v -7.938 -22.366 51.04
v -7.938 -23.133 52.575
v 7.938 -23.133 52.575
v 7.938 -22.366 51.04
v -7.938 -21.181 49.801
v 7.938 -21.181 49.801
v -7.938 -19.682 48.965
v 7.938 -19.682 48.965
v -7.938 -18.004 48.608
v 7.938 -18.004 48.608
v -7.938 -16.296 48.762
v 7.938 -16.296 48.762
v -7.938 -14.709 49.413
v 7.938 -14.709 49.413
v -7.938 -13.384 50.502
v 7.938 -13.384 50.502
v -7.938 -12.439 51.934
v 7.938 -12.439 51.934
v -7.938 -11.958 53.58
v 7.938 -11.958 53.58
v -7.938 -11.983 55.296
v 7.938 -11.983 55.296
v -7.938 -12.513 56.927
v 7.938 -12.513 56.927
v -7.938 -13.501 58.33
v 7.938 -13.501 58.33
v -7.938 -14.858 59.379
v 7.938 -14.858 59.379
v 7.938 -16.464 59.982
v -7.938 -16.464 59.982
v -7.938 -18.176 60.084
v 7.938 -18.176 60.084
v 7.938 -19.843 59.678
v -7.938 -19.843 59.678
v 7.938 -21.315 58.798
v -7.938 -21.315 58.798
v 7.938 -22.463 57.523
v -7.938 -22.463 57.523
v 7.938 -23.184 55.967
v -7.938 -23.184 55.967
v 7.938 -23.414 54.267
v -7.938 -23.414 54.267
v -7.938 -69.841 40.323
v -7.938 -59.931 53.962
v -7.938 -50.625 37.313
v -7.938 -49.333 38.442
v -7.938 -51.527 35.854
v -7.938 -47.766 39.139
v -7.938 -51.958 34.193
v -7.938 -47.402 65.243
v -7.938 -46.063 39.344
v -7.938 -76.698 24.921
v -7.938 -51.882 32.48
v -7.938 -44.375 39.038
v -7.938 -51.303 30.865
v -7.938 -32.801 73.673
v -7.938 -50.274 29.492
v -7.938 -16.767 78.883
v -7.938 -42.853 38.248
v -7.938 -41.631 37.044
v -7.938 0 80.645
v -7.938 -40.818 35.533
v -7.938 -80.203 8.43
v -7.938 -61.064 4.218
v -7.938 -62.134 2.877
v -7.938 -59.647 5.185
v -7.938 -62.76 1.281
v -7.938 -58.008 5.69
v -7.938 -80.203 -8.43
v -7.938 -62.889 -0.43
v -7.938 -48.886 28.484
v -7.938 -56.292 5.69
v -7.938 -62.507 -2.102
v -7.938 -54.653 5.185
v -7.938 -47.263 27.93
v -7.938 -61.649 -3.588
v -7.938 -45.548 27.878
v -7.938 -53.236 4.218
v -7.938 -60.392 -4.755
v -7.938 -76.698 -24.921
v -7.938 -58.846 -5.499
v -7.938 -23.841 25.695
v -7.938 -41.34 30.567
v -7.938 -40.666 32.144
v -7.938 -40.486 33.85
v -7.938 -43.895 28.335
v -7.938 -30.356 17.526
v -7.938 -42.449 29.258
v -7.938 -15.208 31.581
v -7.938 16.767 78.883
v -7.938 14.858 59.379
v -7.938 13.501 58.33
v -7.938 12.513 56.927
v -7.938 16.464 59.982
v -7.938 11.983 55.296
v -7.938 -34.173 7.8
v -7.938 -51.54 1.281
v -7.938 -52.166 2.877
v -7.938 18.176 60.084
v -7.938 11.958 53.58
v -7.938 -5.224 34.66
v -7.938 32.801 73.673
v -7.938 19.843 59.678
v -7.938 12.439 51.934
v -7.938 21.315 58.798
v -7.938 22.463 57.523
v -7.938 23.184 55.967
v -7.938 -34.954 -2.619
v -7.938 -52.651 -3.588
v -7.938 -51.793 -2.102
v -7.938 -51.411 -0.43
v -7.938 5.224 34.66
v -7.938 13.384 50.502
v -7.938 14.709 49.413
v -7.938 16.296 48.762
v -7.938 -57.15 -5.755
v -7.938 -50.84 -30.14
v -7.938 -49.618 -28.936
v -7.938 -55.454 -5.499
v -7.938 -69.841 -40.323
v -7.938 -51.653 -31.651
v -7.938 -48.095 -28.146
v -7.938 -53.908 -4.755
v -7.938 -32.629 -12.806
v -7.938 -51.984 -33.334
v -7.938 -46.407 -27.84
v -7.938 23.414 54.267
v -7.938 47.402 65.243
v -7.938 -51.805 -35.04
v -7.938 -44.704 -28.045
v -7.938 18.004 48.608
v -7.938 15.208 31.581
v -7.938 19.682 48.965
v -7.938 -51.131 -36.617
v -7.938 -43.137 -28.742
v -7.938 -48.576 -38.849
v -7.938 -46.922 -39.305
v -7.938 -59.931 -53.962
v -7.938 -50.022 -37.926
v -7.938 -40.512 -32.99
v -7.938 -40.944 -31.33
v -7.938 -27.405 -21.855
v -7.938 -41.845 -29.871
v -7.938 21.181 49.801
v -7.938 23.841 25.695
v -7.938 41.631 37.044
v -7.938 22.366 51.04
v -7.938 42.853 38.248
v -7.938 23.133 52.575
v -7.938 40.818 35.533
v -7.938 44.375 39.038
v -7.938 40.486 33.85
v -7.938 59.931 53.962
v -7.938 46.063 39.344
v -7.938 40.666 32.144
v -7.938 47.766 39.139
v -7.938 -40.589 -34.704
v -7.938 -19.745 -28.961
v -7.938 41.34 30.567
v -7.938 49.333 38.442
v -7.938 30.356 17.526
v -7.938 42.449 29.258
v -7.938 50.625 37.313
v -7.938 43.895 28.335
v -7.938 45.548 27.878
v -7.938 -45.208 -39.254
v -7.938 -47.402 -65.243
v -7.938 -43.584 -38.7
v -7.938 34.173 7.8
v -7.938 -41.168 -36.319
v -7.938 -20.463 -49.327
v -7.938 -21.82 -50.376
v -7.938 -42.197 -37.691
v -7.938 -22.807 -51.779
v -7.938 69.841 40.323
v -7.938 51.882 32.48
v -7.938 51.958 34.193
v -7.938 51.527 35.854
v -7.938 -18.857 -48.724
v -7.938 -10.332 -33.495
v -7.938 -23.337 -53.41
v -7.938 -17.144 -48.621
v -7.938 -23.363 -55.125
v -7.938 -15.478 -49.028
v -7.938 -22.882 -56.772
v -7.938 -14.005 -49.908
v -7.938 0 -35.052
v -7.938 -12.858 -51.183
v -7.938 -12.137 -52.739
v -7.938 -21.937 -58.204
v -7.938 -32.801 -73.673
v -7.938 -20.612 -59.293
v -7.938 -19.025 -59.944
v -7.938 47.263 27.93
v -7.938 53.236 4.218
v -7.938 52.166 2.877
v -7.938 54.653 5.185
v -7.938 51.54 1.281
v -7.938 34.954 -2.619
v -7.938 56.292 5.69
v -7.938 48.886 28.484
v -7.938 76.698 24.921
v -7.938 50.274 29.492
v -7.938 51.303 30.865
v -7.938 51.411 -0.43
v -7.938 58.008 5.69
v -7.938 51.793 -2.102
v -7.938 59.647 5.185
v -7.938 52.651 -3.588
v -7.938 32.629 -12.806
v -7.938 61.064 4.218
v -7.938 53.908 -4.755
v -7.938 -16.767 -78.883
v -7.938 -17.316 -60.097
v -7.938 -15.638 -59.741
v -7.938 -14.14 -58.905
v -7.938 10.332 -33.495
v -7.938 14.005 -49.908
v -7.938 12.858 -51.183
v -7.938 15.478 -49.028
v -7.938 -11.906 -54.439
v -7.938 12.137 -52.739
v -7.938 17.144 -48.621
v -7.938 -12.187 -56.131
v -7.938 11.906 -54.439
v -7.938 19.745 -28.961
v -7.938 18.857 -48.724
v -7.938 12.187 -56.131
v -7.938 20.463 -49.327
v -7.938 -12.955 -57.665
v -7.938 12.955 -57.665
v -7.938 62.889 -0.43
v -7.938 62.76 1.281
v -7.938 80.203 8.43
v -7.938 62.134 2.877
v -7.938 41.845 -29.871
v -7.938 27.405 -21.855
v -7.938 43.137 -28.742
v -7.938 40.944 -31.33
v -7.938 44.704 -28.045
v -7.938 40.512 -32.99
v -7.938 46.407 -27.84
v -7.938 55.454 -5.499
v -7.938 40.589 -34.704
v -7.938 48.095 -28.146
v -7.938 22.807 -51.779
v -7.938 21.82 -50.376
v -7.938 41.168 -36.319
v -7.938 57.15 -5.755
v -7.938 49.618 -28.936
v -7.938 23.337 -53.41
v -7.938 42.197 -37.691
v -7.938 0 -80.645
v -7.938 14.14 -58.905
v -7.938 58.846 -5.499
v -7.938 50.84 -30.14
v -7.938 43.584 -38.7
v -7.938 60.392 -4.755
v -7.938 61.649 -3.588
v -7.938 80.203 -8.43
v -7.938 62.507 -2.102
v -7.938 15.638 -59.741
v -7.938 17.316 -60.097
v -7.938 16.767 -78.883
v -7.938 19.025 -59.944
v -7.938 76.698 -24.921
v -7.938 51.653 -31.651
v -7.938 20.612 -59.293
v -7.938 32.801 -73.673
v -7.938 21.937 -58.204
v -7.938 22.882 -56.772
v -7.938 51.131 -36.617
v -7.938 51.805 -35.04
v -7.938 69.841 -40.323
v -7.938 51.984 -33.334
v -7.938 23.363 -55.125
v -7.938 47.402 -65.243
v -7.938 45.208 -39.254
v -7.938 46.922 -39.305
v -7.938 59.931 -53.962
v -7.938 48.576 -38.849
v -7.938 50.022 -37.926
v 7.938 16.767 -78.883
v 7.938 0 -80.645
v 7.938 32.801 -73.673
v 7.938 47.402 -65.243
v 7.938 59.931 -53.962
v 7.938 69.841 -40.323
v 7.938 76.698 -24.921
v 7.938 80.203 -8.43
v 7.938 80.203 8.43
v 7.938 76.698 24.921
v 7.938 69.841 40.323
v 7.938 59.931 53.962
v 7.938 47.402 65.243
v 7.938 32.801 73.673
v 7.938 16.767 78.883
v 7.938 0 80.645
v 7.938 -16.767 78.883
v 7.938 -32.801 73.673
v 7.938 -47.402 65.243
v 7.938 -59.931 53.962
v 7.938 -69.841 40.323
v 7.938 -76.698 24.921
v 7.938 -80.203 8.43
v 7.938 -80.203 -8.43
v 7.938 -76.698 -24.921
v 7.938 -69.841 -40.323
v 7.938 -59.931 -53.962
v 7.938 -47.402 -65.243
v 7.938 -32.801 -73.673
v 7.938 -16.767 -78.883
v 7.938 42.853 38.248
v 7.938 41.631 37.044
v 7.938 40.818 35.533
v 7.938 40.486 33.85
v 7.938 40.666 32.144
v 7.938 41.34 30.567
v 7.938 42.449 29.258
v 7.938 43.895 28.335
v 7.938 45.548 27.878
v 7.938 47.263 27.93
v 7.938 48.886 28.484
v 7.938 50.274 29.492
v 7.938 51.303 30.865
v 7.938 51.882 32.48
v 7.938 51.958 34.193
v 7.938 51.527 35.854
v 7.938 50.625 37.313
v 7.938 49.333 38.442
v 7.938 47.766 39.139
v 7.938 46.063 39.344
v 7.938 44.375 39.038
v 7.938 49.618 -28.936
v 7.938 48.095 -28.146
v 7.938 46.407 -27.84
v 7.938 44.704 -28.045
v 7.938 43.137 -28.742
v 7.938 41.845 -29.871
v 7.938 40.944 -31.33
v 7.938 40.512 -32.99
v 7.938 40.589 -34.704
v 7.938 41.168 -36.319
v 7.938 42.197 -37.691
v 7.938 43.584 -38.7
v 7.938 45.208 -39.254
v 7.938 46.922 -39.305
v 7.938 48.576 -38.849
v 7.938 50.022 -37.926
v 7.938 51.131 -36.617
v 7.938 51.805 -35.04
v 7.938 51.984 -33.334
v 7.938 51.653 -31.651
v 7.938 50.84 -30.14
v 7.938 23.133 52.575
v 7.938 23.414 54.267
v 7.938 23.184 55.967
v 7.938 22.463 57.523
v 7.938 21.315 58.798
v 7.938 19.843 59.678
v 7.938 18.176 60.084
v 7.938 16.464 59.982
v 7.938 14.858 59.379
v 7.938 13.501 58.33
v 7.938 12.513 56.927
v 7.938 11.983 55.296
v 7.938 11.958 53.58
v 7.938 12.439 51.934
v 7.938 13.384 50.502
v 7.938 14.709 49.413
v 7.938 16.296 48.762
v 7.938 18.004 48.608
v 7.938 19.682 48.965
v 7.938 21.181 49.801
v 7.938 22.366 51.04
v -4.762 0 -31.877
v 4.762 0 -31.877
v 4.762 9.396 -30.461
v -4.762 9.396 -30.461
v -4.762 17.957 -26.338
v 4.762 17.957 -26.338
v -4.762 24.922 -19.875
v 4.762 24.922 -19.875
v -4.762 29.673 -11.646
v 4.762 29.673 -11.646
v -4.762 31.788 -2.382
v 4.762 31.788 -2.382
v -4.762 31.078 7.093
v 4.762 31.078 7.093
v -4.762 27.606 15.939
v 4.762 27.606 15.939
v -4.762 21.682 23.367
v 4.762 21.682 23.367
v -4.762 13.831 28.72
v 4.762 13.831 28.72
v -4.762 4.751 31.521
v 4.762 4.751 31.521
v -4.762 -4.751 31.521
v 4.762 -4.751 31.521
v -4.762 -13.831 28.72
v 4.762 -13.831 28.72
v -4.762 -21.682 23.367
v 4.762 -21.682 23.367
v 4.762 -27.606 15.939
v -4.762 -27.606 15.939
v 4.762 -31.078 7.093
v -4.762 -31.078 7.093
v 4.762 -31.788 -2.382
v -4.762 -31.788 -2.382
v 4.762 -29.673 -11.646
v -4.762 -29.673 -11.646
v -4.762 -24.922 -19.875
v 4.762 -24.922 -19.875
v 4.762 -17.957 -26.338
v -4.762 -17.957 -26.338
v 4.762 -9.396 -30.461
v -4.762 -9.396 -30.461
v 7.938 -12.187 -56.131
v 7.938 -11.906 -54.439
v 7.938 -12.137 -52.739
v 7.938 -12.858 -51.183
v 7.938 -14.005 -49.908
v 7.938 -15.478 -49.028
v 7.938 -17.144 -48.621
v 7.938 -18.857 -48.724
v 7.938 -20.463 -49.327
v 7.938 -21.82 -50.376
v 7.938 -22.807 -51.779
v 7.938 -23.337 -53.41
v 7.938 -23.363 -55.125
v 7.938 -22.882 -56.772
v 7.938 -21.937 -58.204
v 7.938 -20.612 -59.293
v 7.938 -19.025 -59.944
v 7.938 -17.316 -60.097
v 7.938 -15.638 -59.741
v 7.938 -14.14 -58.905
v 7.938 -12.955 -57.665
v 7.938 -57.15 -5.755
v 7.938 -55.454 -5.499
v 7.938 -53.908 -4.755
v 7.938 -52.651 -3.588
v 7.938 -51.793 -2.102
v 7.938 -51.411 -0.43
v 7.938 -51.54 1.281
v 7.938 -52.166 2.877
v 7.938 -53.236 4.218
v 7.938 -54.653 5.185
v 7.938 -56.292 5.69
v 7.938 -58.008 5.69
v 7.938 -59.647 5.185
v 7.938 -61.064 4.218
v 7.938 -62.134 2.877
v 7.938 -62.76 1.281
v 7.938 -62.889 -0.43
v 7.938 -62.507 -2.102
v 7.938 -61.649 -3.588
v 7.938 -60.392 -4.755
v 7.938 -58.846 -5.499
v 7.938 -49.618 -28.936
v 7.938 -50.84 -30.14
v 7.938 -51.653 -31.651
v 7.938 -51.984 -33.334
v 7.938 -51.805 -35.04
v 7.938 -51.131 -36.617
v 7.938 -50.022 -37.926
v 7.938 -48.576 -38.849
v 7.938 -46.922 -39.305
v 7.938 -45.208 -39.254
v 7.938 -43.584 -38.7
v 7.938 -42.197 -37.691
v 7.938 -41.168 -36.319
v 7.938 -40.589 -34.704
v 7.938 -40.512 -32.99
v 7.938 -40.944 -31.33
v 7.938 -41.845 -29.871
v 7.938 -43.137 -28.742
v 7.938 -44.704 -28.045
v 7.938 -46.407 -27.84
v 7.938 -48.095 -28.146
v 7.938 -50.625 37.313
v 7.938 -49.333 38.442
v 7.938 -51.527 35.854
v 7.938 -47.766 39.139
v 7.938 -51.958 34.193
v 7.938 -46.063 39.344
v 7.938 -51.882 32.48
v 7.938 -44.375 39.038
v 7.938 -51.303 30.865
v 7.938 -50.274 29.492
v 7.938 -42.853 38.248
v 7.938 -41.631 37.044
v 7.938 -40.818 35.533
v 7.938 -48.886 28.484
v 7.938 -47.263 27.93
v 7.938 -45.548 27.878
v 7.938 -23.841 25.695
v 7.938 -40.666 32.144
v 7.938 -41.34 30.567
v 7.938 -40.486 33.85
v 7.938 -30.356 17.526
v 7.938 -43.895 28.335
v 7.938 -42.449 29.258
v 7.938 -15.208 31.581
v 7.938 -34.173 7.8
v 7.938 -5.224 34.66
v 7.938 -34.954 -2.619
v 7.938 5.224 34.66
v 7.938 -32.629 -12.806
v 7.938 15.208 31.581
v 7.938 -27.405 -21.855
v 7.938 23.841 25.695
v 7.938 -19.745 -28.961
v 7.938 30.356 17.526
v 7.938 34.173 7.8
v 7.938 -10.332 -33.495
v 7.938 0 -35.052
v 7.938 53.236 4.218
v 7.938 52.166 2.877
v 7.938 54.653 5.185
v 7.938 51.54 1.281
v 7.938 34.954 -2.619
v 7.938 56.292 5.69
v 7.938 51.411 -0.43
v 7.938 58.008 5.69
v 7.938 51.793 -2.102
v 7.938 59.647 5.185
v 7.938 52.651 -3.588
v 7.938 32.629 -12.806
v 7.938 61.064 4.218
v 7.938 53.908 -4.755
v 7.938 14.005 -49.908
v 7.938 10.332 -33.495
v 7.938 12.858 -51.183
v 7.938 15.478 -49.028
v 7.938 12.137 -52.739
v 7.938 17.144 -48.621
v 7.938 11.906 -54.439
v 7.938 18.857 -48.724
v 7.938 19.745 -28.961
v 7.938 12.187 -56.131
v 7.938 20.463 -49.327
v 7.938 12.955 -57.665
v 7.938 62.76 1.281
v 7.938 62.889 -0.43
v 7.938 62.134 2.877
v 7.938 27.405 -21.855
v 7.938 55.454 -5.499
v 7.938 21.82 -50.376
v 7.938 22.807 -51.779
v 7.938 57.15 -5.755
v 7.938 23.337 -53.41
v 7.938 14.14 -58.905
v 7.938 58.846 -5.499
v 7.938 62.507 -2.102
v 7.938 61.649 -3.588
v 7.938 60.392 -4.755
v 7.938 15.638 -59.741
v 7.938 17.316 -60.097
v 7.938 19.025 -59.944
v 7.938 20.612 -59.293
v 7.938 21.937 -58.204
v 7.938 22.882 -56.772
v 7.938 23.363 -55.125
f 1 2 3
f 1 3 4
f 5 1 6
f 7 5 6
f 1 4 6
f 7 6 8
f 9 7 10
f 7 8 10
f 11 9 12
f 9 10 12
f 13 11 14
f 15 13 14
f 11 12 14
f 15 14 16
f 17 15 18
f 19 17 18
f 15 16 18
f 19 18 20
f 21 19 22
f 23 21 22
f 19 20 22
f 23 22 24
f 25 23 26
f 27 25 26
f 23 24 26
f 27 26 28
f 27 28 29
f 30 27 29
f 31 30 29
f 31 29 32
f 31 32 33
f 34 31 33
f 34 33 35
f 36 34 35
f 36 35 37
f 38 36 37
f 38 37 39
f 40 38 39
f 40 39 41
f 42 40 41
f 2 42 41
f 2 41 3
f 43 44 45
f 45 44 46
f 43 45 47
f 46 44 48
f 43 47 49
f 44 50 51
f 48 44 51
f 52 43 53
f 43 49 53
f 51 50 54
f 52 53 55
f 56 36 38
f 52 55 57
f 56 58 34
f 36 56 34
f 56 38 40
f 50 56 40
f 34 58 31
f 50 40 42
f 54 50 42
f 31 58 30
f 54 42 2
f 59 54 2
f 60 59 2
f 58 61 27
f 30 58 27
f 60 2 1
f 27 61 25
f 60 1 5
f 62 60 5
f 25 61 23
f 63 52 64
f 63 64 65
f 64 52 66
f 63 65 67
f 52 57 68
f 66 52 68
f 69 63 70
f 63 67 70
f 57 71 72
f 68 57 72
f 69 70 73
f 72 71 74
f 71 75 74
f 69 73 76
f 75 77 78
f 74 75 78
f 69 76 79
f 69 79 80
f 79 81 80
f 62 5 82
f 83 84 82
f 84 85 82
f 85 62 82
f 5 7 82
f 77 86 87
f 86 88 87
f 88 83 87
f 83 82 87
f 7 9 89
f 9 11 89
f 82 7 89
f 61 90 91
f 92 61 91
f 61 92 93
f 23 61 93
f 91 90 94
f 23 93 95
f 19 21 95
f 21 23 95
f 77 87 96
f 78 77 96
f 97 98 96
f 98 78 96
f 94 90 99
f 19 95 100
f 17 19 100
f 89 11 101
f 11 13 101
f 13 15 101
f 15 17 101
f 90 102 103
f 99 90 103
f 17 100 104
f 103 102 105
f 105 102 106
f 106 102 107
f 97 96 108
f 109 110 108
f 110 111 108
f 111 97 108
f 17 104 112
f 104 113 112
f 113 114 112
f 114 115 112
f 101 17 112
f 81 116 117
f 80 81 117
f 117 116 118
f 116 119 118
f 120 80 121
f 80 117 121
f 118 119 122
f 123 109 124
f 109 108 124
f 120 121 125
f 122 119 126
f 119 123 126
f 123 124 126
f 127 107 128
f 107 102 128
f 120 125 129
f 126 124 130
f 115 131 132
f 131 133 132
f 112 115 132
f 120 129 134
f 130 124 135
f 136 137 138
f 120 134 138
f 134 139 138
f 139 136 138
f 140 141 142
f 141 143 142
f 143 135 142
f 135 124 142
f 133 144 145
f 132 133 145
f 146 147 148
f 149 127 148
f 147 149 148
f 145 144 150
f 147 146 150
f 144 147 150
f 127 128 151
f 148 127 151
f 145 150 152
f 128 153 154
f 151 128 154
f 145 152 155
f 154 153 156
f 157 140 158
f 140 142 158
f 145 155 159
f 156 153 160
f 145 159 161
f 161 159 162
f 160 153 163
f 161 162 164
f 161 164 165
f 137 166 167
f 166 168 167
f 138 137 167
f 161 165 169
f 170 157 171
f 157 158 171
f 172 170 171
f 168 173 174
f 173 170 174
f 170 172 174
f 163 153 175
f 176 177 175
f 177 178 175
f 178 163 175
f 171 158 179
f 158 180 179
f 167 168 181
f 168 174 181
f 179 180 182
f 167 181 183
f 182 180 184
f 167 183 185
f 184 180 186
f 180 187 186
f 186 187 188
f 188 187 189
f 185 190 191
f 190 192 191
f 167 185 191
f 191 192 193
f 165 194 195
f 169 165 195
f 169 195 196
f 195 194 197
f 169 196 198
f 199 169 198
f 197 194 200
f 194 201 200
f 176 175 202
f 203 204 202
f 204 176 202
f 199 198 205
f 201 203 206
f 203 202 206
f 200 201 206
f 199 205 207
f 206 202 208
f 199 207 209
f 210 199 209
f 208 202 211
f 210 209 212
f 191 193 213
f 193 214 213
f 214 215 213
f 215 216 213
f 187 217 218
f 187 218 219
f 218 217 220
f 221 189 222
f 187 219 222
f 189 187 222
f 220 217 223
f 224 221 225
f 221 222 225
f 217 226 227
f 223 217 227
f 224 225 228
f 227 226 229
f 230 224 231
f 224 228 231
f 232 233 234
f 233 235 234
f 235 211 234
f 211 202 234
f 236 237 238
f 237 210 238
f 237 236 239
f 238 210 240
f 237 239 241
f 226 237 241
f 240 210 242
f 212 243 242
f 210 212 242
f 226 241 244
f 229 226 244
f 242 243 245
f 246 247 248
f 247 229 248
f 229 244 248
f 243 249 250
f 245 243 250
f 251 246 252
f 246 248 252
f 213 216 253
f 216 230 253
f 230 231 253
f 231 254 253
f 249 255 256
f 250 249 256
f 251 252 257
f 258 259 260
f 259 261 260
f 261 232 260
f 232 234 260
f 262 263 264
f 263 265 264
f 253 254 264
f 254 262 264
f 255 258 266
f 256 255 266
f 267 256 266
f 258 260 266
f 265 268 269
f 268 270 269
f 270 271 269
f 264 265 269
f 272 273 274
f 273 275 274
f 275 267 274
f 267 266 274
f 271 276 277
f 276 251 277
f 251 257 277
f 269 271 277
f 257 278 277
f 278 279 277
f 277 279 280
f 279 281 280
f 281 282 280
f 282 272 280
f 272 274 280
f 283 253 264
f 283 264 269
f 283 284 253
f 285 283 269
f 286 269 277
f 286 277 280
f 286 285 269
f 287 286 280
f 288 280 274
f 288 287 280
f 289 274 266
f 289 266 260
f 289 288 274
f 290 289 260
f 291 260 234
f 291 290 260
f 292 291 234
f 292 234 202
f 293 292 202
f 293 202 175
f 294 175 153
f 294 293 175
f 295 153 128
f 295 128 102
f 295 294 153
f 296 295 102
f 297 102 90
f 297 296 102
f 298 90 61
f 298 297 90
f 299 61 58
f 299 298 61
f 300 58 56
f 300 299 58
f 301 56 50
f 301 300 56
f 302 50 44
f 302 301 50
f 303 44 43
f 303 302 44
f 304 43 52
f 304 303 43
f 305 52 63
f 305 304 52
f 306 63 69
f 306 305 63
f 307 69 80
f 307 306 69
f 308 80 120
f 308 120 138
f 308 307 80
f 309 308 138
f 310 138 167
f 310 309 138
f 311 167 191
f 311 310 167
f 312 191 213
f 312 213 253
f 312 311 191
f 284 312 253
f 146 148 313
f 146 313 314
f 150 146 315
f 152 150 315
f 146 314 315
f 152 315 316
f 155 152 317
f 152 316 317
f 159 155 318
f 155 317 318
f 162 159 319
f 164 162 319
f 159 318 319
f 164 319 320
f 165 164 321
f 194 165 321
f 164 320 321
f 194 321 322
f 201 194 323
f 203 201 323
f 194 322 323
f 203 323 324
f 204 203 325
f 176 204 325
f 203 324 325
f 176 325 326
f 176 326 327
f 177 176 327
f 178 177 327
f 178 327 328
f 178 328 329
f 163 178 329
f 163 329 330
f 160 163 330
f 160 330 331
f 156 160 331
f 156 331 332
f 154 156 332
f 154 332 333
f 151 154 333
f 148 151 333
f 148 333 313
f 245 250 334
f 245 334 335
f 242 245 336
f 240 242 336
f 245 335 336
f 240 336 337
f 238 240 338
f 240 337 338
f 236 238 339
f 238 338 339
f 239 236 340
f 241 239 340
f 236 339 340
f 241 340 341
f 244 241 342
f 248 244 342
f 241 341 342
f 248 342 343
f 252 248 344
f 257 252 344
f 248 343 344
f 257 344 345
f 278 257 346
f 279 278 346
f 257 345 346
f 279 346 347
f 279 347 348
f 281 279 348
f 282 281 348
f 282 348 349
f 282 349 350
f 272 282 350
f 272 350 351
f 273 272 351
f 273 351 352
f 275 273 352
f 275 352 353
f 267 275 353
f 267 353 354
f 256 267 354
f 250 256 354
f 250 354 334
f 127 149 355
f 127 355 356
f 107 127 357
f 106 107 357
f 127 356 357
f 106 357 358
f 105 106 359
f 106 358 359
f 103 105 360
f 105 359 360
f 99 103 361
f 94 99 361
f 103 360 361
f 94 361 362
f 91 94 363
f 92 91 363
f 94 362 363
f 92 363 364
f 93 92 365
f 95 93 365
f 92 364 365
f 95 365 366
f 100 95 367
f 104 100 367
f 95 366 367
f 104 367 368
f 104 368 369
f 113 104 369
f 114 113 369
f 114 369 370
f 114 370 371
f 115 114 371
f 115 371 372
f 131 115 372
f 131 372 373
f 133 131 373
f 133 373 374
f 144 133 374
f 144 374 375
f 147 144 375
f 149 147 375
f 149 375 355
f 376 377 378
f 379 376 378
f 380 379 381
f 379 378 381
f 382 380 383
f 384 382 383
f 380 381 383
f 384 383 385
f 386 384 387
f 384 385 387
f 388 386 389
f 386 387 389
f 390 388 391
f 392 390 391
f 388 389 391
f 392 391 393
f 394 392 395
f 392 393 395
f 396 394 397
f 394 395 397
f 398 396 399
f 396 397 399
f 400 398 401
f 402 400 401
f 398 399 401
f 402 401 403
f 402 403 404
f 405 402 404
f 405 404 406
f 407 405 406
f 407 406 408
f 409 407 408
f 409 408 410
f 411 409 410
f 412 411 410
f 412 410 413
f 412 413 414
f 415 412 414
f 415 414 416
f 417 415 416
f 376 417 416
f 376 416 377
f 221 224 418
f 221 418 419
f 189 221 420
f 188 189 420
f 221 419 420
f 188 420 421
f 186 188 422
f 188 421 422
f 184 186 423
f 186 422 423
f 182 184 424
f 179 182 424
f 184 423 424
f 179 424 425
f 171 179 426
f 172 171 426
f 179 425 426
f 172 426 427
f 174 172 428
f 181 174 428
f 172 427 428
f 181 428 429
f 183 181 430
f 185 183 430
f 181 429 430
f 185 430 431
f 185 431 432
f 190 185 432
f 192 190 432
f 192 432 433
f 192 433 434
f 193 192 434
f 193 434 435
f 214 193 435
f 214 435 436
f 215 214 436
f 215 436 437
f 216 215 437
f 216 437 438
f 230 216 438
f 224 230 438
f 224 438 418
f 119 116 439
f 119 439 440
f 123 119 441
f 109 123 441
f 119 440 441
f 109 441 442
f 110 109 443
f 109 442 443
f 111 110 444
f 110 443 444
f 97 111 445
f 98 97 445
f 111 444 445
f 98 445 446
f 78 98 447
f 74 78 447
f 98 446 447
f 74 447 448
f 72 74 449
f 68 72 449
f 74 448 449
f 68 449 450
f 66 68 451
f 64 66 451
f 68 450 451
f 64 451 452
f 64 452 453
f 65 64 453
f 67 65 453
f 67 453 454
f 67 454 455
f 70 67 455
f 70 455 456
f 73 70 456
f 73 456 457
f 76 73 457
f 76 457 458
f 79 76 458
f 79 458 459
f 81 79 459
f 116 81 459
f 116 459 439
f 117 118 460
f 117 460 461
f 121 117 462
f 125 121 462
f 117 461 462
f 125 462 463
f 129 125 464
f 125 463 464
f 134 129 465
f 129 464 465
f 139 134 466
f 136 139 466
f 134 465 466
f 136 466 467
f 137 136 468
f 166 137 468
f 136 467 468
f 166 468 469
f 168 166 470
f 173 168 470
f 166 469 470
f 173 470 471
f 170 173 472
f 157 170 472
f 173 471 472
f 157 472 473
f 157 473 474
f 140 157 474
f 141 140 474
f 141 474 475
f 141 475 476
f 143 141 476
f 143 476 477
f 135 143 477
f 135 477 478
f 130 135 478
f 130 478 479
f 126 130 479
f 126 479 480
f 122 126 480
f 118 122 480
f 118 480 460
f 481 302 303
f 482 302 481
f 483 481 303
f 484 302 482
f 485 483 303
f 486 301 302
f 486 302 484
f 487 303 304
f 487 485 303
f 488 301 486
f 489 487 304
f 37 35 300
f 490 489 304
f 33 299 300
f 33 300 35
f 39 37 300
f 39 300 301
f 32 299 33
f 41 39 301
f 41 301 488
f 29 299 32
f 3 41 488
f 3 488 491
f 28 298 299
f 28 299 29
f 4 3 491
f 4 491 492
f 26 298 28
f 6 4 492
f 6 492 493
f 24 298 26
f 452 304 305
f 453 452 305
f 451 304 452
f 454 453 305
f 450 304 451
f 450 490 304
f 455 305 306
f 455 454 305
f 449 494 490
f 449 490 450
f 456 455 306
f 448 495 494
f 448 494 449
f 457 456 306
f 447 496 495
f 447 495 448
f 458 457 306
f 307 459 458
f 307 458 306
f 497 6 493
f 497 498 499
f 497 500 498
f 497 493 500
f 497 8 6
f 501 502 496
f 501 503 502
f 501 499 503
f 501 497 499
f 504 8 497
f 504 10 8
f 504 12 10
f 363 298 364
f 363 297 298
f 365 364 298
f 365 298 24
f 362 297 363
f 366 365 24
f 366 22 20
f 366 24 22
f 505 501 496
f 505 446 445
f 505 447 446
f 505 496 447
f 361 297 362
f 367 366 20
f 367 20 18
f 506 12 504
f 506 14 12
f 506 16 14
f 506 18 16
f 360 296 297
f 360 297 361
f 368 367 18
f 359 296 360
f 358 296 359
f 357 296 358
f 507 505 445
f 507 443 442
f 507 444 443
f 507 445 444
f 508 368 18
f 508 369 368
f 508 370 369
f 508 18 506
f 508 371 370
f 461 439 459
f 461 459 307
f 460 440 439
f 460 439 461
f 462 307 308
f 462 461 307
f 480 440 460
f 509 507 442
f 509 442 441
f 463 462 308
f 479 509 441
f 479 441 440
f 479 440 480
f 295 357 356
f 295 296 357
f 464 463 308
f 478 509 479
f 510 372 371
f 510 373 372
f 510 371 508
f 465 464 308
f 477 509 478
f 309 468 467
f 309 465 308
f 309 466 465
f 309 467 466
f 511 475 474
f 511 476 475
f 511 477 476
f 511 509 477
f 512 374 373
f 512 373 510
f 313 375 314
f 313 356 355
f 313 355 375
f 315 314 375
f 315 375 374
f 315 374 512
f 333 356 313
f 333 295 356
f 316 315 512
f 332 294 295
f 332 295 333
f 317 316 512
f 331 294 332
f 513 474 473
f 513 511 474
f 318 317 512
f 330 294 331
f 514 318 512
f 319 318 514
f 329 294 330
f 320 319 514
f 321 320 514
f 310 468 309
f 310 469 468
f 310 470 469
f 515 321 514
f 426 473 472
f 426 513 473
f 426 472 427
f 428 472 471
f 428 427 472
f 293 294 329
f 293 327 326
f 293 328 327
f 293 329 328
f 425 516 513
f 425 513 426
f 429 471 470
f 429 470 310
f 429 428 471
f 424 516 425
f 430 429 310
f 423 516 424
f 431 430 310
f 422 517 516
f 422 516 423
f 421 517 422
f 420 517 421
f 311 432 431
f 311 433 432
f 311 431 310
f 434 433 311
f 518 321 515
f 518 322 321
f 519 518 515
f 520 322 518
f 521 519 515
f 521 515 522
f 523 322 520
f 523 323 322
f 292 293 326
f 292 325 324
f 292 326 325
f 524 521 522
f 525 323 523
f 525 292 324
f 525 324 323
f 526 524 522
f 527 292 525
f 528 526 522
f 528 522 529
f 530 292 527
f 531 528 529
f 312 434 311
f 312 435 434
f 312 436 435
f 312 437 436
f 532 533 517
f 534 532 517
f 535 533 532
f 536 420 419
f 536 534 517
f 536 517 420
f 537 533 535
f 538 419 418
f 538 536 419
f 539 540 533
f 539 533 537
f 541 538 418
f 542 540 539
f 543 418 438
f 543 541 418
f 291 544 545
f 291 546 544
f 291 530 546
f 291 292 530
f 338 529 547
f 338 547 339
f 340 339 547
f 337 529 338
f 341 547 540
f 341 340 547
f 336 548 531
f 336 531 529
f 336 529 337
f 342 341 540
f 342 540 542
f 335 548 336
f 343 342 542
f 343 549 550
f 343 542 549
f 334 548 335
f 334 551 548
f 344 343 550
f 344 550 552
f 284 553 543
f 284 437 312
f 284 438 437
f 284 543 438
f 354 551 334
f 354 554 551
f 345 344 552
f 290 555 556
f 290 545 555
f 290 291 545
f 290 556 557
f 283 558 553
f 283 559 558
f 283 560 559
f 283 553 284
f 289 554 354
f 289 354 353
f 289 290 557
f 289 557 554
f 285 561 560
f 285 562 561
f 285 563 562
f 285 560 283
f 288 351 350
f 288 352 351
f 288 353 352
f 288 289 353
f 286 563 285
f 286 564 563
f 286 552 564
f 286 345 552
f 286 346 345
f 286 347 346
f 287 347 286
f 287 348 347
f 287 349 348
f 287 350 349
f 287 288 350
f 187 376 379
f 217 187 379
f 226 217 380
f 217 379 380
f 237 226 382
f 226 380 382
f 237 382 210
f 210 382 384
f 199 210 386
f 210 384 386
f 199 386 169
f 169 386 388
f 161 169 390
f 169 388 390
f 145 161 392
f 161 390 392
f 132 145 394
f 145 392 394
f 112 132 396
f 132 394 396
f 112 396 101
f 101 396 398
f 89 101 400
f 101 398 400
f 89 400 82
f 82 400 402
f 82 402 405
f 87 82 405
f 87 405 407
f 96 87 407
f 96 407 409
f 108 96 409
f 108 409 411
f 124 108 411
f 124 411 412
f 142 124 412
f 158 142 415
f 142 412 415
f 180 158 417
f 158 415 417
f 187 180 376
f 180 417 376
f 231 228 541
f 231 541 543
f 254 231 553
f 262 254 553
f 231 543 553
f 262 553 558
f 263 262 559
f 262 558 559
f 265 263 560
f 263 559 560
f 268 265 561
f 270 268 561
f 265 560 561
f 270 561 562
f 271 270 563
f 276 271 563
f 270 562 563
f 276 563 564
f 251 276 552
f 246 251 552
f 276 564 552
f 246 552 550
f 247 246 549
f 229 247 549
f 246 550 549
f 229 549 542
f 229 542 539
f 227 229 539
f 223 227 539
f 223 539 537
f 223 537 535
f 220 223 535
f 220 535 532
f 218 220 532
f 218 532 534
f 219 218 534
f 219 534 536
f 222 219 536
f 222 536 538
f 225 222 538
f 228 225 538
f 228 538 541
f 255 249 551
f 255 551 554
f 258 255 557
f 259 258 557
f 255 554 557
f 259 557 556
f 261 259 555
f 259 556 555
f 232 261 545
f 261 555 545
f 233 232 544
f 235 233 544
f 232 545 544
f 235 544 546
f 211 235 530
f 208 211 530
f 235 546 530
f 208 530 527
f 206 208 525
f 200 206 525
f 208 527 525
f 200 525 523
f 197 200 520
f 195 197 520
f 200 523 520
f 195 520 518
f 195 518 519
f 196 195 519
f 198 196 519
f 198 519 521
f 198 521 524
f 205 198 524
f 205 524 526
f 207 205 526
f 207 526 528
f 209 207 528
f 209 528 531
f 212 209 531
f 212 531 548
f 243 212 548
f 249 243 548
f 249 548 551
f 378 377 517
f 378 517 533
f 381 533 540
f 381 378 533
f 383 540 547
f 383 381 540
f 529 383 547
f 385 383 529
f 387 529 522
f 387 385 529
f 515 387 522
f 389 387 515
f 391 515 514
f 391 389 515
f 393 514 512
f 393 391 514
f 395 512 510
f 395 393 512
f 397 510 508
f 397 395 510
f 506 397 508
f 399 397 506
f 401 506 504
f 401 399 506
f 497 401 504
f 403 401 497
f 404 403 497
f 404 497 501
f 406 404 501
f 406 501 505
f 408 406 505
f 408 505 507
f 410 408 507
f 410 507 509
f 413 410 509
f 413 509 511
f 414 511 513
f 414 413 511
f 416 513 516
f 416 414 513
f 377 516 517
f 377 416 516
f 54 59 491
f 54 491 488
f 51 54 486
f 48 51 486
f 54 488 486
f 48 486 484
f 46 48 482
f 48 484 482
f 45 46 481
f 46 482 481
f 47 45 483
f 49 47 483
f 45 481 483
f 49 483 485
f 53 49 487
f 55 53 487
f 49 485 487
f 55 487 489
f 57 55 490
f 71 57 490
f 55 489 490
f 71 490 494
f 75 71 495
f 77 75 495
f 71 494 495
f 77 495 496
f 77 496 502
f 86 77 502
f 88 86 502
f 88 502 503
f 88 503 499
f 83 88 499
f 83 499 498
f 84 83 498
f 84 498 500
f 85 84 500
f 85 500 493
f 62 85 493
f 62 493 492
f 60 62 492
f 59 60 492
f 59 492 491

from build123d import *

# Parameters (mm, degrees)
SKETCH1_R           = 80.645
BOSS_EXTRUDE1_DEPTH = 7.9375
SKETCH3_R           = 31.877
CUT_EXTRUDE1_DEPTH  = 16.875
CHAMFER1_SIZE       = 3.175
SKETCH5_R           = 5.7546875
CUT_EXTRUDE2_DEPTH  = 16.875
CIRPATTERN1_COUNT   = 5
SKETCH6_R           = 5.7546875
CUT_EXTRUDE3_DEPTH  = 16.875
CIRPATTERN2_COUNT   = 5


with BuildPart() as part:
    # Sketch1 → Boss-Extrude1 (new body, symmetric)
    with BuildSketch(Plane(origin=(0, 0, 0), x_dir=(0, 0, -1), z_dir=(1, 0, 0))):
        Circle(SKETCH1_R)
    extrude(amount=BOSS_EXTRUDE1_DEPTH, both=True)

    # Sketch3 → Cut-Extrude1 (cut, through all)
    with BuildSketch(Plane(origin=(7.9375, 0, 0), x_dir=(0, 0, -1), z_dir=(1, 0, 0))):
        Circle(SKETCH3_R)
    extrude(amount=-CUT_EXTRUDE1_DEPTH, mode=Mode.SUBTRACT)

    # Chamfer1
    chamfer1_edges = [part.edges().sort_by_distance(p)[0] for p in [
        (-7.9375, 0, 31.877),
        (7.9375, 0, 31.877),
    ]]
    chamfer(chamfer1_edges, length=CHAMFER1_SIZE)

    # Sketch5 → Cut-Extrude2 (cut, through all)
    with BuildSketch(Plane(origin=(7.9375, 0, 0), x_dir=(0, 0, -1), z_dir=(1, 0, 0))):
        with Locations((0, 57.15)):
            Circle(SKETCH5_R)
    cut_extrude2 = extrude(amount=-CUT_EXTRUDE2_DEPTH, mode=Mode.SUBTRACT)

    # CirPattern1: Cut-Extrude2 ×5 about axis
    cirpattern1_axis = Axis((0, 0, 0), (1, 0, 0))
    for i in range(1, CIRPATTERN1_COUNT):
        add(cut_extrude2.rotate(cirpattern1_axis, i * 360 / CIRPATTERN1_COUNT), mode=Mode.SUBTRACT)

    # Sketch6 → Cut-Extrude3 (cut, through all)
    with BuildSketch(Plane(origin=(7.9375, 0, 0), x_dir=(0, 0, -1), z_dir=(1, 0, 0))):
        with Locations((0, -57.15)):
            Circle(SKETCH6_R)
    cut_extrude3 = extrude(amount=-CUT_EXTRUDE3_DEPTH, mode=Mode.SUBTRACT)

    # CirPattern2: Cut-Extrude3 ×5 about axis
    cirpattern2_axis = Axis((0, 0, 0), (1, 0, 0))
    for i in range(1, CIRPATTERN2_COUNT):
        add(cut_extrude3.rotate(cirpattern2_axis, i * 360 / CIRPATTERN2_COUNT), mode=Mode.SUBTRACT)


solid = part.part
